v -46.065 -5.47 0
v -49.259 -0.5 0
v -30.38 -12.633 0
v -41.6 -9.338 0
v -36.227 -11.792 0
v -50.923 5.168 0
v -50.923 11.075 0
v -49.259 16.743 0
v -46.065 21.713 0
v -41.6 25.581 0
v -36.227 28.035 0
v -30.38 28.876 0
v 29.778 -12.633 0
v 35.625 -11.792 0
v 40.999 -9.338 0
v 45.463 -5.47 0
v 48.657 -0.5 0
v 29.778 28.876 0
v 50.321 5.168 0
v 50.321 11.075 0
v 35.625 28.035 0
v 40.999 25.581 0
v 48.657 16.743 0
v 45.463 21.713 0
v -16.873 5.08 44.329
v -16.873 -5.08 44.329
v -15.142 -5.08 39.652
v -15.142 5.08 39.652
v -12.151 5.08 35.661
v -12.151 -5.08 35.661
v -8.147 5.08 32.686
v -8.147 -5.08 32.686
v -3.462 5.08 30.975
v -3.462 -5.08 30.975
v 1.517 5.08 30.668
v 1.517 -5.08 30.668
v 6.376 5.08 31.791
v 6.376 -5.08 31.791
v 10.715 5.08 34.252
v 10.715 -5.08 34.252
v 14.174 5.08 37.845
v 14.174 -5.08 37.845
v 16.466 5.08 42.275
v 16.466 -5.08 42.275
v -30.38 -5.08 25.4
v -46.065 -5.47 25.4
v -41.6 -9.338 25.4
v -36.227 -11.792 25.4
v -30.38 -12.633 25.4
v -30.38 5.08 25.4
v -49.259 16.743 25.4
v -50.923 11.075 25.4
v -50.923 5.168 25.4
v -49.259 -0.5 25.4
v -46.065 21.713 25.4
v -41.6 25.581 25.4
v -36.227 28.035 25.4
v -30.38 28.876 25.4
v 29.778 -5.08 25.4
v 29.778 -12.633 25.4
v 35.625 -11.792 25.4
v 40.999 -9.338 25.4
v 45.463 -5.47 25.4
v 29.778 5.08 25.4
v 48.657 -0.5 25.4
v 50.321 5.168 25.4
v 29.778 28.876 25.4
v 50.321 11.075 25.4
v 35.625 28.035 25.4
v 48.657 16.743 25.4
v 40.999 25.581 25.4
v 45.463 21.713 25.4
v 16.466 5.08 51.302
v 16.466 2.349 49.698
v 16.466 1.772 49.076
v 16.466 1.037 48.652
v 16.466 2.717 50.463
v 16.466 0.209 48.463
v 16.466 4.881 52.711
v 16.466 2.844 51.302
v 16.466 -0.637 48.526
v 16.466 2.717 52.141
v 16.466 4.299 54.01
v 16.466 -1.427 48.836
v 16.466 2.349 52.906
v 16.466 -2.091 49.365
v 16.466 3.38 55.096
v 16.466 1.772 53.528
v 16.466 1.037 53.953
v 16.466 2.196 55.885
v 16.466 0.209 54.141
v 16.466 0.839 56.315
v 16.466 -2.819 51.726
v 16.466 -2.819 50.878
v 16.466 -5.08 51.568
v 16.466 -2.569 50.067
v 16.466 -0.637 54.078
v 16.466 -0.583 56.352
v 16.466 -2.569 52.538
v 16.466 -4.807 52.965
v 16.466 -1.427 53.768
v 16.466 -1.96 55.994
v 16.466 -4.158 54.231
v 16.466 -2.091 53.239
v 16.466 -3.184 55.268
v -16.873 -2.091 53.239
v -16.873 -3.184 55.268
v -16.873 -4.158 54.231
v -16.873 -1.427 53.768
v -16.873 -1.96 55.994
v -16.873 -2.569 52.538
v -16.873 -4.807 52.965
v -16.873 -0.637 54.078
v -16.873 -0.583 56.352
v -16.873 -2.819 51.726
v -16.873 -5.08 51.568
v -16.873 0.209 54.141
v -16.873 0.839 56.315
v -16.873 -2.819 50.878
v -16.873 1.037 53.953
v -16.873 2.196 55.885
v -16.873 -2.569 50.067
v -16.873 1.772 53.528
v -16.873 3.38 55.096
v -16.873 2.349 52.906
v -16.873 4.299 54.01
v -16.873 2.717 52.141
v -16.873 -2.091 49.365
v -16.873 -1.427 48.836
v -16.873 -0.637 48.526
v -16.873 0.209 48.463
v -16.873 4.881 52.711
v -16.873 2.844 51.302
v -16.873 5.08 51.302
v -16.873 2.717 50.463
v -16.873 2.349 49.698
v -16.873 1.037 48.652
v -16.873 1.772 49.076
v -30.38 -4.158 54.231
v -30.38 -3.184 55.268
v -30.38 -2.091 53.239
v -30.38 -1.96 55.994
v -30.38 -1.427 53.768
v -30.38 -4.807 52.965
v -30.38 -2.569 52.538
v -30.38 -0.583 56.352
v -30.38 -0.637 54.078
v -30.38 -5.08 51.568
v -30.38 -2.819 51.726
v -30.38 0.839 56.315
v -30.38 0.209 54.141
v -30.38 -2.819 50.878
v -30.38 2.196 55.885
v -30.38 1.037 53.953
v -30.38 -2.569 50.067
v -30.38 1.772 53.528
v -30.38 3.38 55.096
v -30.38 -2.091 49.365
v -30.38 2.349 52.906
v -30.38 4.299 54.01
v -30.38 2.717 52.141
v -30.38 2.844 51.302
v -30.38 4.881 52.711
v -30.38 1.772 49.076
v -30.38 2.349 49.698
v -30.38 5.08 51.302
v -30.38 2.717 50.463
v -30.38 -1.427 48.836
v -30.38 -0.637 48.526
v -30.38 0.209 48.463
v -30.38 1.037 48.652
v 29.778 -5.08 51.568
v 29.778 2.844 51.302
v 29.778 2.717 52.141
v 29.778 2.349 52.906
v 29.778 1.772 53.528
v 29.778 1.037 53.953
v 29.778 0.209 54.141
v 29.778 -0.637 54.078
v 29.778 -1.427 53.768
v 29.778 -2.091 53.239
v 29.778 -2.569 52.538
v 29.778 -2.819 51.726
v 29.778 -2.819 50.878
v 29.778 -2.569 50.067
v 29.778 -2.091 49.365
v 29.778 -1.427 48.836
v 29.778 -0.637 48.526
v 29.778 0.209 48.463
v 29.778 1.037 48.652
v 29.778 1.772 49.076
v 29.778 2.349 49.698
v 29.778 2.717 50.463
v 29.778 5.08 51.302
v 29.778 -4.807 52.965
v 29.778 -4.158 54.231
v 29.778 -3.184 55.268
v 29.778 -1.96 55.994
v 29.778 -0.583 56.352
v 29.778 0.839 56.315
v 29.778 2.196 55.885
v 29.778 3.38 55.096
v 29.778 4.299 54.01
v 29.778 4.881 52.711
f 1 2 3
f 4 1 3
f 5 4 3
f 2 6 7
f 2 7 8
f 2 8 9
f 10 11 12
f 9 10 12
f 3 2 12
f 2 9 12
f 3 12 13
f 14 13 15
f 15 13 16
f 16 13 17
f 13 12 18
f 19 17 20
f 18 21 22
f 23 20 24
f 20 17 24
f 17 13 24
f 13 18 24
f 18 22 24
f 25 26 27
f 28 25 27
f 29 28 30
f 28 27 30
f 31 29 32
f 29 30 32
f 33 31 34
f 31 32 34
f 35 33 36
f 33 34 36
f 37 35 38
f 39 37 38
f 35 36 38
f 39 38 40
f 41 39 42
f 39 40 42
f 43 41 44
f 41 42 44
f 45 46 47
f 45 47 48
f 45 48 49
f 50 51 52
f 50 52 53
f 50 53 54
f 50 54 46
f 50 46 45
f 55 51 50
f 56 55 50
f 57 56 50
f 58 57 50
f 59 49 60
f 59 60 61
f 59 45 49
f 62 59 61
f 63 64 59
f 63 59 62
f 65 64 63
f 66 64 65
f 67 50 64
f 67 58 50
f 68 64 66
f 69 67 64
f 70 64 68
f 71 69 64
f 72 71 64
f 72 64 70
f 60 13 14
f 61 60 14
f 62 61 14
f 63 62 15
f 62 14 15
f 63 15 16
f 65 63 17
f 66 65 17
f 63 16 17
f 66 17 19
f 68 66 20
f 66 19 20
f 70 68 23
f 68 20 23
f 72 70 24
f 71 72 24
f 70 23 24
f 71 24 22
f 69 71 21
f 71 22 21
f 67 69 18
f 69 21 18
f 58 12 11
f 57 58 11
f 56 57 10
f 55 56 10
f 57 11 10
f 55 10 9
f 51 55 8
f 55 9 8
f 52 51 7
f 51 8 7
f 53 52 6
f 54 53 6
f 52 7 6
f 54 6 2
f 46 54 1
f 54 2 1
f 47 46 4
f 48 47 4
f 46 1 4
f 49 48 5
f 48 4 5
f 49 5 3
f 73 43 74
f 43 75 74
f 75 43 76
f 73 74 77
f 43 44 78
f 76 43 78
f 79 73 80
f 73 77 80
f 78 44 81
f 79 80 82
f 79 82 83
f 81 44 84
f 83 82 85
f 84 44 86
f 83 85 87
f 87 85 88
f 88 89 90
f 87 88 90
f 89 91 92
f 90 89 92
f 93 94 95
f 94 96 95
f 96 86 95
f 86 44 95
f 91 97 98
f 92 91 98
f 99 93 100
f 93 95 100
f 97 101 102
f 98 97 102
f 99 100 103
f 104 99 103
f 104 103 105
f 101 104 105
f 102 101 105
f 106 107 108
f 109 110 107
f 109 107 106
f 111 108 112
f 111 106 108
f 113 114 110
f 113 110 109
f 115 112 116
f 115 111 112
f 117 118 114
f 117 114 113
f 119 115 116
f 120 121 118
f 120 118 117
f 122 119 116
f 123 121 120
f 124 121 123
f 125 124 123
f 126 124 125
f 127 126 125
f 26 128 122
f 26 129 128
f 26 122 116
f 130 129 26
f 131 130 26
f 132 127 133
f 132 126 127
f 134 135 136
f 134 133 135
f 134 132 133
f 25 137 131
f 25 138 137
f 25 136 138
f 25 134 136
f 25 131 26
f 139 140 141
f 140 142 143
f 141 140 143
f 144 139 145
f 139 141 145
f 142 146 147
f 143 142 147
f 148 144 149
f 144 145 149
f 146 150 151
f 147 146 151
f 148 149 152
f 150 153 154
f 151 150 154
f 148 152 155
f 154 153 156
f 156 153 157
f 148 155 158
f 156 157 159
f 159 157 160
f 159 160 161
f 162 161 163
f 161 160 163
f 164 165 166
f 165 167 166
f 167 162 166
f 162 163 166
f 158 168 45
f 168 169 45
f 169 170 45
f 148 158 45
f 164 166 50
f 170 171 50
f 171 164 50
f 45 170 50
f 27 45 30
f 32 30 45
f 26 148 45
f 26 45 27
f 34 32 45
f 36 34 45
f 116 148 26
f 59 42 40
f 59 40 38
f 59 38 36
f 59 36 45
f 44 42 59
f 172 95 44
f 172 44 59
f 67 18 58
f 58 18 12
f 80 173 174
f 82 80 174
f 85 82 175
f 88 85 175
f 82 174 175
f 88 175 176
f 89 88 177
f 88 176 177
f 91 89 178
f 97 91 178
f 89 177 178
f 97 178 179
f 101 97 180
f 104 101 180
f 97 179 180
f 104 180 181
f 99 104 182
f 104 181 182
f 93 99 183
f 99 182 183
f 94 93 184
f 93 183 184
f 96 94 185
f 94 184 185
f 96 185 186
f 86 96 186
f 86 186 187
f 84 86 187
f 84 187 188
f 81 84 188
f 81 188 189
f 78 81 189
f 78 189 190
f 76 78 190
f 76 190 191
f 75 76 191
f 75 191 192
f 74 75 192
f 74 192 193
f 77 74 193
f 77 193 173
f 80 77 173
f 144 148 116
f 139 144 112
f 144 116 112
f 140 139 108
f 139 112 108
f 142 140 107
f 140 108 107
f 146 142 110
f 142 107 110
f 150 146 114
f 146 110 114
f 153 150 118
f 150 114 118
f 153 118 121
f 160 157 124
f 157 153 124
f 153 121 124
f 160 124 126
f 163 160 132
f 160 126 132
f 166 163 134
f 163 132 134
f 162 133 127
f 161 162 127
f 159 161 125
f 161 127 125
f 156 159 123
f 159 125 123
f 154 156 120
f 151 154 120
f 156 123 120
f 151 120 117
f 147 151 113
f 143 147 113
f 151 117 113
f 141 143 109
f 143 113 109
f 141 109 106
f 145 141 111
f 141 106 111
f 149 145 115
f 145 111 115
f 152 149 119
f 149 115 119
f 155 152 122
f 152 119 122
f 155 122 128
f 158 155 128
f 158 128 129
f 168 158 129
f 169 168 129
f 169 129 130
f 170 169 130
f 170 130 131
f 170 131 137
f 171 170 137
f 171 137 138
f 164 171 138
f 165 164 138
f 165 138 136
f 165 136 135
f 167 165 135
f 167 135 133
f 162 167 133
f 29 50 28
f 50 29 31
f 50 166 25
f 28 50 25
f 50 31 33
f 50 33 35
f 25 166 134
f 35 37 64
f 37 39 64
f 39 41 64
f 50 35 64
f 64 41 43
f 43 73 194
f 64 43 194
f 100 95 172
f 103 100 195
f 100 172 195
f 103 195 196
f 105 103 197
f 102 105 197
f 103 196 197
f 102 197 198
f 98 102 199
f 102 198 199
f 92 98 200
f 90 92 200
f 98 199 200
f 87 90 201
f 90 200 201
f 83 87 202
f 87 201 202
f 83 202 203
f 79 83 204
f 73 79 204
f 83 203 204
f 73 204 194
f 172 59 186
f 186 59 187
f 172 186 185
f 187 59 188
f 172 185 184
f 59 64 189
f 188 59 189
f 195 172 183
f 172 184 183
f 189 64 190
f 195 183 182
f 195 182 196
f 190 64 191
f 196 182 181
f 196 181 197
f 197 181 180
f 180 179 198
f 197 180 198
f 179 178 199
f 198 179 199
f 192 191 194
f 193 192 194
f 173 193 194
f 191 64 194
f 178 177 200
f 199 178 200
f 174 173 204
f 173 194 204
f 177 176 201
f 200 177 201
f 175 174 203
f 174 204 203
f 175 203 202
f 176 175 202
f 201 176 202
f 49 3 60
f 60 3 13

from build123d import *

# Parameters (mm, degrees)
F1_DEPTH  = 25.4
F3_DEPTH  = 5.08
F5_DEPTH  = 5.08
F7_DEPTH  = 80.913372
F8_R      = 2.847327
F9_DEPTH  = 80.913372
F11_DEPTH = 25.4
F12_DEPTH = 25.4


with BuildPart() as f1:
    # F0 (on Top) → F1 (new body)
    with BuildSketch(Plane.XY):
        with BuildLine():
            Line((29.77816, 28.875791), (-30.379737, 28.875791))
            ThreePointArc((-30.379737, 28.875791), (-51.134211, 8.121316), (-30.379737, -12.633159))
            Line((-30.379737, -12.633159), (29.77816, -12.633159))
            ThreePointArc((29.77816, -12.633159), (50.532635, 8.121316), (29.77816, 28.875791))
        make_face()
    extrude(amount=F1_DEPTH)

    # F2 (on Front) → F3 (join)
    with BuildSketch(Plane.XZ):
        with BuildLine():
            Line((-30.379737, 59.542328), (-30.379737, 25.4))
            Line((-30.379737, 25.4), (29.77816, 25.4))
            Line((29.77816, 25.4), (29.77816, 59.542328))
            Line((29.77816, 59.542328), (15.948839, 59.542328))
            ThreePointArc((15.948839, 59.542328), (-0.531627, 43.41897), (-17.012093, 59.542328))
            Line((-17.012093, 59.542328), (-30.379737, 59.542328))
        make_face()
    extrude(amount=-F3_DEPTH)

    # F4 (on face) → F5 (join)
    with BuildSketch(Plane.XZ):
        with BuildLine():
            Line((-30.379737, 59.542328), (-30.379737, 25.4))
            Line((-30.379737, 25.4), (29.77816, 25.4))
            Line((29.77816, 25.4), (29.77816, 59.542328))
            Line((29.77816, 59.542328), (15.948839, 59.542328))
            ThreePointArc((15.948839, 59.542328), (-0.531627, 43.41897), (-17.012093, 59.542328))
            Line((-17.012093, 59.542328), (-30.379737, 59.542328))
        make_face()
    extrude(amount=F5_DEPTH)

    # F6 (on face) → F7 (cut, through all)
    with BuildSketch(Plane.YZ.offset(29.77816)):
        with BuildLine():
            Line((5.08, 51.302094), (5.08, 59.542328))
            Line((5.08, 59.542328), (-5.08, 59.542328))
            Line((-5.08, 59.542328), (-5.08, 51.567905))
            ThreePointArc((-5.08, 51.567905), (0.129474, 56.383832), (5.08, 51.302094))
        make_face()
    extrude(amount=-F7_DEPTH, mode=Mode.SUBTRACT)

    # F8 (on face) → F9 (cut, through all)
    with BuildSketch(Plane.YZ.offset(29.77816)):
        with Locations((-0.003477, 51.302094)):
            Circle(F8_R)
    extrude(amount=-F9_DEPTH, mode=Mode.SUBTRACT)

    # F10 (on Front) → F11 (cut)
    with BuildSketch(Plane.XZ):
        with BuildLine():
            Line((16.466387, 42.275124), (16.466387, 56.385571))
            Line((16.466387, 56.385571), (-16.873172, 56.385571))
            Line((-16.873172, 56.385571), (-16.873172, 44.329444))
            ThreePointArc((-16.873172, 44.329444), (-0.983531, 30.641417), (16.466387, 42.275124))
        make_face()
    extrude(amount=F11_DEPTH, mode=Mode.SUBTRACT)

    # F10 (on Front) → F12 (cut)
    with BuildSketch(Plane.XZ):
        with BuildLine():
            Line((16.466387, 42.275124), (16.466387, 56.385571))
            Line((16.466387, 56.385571), (-16.873172, 56.385571))
            Line((-16.873172, 56.385571), (-16.873172, 44.329444))
            ThreePointArc((-16.873172, 44.329444), (-0.983531, 30.641417), (16.466387, 42.275124))
        make_face()
    extrude(amount=-F12_DEPTH, mode=Mode.SUBTRACT)


solid = f1.part
